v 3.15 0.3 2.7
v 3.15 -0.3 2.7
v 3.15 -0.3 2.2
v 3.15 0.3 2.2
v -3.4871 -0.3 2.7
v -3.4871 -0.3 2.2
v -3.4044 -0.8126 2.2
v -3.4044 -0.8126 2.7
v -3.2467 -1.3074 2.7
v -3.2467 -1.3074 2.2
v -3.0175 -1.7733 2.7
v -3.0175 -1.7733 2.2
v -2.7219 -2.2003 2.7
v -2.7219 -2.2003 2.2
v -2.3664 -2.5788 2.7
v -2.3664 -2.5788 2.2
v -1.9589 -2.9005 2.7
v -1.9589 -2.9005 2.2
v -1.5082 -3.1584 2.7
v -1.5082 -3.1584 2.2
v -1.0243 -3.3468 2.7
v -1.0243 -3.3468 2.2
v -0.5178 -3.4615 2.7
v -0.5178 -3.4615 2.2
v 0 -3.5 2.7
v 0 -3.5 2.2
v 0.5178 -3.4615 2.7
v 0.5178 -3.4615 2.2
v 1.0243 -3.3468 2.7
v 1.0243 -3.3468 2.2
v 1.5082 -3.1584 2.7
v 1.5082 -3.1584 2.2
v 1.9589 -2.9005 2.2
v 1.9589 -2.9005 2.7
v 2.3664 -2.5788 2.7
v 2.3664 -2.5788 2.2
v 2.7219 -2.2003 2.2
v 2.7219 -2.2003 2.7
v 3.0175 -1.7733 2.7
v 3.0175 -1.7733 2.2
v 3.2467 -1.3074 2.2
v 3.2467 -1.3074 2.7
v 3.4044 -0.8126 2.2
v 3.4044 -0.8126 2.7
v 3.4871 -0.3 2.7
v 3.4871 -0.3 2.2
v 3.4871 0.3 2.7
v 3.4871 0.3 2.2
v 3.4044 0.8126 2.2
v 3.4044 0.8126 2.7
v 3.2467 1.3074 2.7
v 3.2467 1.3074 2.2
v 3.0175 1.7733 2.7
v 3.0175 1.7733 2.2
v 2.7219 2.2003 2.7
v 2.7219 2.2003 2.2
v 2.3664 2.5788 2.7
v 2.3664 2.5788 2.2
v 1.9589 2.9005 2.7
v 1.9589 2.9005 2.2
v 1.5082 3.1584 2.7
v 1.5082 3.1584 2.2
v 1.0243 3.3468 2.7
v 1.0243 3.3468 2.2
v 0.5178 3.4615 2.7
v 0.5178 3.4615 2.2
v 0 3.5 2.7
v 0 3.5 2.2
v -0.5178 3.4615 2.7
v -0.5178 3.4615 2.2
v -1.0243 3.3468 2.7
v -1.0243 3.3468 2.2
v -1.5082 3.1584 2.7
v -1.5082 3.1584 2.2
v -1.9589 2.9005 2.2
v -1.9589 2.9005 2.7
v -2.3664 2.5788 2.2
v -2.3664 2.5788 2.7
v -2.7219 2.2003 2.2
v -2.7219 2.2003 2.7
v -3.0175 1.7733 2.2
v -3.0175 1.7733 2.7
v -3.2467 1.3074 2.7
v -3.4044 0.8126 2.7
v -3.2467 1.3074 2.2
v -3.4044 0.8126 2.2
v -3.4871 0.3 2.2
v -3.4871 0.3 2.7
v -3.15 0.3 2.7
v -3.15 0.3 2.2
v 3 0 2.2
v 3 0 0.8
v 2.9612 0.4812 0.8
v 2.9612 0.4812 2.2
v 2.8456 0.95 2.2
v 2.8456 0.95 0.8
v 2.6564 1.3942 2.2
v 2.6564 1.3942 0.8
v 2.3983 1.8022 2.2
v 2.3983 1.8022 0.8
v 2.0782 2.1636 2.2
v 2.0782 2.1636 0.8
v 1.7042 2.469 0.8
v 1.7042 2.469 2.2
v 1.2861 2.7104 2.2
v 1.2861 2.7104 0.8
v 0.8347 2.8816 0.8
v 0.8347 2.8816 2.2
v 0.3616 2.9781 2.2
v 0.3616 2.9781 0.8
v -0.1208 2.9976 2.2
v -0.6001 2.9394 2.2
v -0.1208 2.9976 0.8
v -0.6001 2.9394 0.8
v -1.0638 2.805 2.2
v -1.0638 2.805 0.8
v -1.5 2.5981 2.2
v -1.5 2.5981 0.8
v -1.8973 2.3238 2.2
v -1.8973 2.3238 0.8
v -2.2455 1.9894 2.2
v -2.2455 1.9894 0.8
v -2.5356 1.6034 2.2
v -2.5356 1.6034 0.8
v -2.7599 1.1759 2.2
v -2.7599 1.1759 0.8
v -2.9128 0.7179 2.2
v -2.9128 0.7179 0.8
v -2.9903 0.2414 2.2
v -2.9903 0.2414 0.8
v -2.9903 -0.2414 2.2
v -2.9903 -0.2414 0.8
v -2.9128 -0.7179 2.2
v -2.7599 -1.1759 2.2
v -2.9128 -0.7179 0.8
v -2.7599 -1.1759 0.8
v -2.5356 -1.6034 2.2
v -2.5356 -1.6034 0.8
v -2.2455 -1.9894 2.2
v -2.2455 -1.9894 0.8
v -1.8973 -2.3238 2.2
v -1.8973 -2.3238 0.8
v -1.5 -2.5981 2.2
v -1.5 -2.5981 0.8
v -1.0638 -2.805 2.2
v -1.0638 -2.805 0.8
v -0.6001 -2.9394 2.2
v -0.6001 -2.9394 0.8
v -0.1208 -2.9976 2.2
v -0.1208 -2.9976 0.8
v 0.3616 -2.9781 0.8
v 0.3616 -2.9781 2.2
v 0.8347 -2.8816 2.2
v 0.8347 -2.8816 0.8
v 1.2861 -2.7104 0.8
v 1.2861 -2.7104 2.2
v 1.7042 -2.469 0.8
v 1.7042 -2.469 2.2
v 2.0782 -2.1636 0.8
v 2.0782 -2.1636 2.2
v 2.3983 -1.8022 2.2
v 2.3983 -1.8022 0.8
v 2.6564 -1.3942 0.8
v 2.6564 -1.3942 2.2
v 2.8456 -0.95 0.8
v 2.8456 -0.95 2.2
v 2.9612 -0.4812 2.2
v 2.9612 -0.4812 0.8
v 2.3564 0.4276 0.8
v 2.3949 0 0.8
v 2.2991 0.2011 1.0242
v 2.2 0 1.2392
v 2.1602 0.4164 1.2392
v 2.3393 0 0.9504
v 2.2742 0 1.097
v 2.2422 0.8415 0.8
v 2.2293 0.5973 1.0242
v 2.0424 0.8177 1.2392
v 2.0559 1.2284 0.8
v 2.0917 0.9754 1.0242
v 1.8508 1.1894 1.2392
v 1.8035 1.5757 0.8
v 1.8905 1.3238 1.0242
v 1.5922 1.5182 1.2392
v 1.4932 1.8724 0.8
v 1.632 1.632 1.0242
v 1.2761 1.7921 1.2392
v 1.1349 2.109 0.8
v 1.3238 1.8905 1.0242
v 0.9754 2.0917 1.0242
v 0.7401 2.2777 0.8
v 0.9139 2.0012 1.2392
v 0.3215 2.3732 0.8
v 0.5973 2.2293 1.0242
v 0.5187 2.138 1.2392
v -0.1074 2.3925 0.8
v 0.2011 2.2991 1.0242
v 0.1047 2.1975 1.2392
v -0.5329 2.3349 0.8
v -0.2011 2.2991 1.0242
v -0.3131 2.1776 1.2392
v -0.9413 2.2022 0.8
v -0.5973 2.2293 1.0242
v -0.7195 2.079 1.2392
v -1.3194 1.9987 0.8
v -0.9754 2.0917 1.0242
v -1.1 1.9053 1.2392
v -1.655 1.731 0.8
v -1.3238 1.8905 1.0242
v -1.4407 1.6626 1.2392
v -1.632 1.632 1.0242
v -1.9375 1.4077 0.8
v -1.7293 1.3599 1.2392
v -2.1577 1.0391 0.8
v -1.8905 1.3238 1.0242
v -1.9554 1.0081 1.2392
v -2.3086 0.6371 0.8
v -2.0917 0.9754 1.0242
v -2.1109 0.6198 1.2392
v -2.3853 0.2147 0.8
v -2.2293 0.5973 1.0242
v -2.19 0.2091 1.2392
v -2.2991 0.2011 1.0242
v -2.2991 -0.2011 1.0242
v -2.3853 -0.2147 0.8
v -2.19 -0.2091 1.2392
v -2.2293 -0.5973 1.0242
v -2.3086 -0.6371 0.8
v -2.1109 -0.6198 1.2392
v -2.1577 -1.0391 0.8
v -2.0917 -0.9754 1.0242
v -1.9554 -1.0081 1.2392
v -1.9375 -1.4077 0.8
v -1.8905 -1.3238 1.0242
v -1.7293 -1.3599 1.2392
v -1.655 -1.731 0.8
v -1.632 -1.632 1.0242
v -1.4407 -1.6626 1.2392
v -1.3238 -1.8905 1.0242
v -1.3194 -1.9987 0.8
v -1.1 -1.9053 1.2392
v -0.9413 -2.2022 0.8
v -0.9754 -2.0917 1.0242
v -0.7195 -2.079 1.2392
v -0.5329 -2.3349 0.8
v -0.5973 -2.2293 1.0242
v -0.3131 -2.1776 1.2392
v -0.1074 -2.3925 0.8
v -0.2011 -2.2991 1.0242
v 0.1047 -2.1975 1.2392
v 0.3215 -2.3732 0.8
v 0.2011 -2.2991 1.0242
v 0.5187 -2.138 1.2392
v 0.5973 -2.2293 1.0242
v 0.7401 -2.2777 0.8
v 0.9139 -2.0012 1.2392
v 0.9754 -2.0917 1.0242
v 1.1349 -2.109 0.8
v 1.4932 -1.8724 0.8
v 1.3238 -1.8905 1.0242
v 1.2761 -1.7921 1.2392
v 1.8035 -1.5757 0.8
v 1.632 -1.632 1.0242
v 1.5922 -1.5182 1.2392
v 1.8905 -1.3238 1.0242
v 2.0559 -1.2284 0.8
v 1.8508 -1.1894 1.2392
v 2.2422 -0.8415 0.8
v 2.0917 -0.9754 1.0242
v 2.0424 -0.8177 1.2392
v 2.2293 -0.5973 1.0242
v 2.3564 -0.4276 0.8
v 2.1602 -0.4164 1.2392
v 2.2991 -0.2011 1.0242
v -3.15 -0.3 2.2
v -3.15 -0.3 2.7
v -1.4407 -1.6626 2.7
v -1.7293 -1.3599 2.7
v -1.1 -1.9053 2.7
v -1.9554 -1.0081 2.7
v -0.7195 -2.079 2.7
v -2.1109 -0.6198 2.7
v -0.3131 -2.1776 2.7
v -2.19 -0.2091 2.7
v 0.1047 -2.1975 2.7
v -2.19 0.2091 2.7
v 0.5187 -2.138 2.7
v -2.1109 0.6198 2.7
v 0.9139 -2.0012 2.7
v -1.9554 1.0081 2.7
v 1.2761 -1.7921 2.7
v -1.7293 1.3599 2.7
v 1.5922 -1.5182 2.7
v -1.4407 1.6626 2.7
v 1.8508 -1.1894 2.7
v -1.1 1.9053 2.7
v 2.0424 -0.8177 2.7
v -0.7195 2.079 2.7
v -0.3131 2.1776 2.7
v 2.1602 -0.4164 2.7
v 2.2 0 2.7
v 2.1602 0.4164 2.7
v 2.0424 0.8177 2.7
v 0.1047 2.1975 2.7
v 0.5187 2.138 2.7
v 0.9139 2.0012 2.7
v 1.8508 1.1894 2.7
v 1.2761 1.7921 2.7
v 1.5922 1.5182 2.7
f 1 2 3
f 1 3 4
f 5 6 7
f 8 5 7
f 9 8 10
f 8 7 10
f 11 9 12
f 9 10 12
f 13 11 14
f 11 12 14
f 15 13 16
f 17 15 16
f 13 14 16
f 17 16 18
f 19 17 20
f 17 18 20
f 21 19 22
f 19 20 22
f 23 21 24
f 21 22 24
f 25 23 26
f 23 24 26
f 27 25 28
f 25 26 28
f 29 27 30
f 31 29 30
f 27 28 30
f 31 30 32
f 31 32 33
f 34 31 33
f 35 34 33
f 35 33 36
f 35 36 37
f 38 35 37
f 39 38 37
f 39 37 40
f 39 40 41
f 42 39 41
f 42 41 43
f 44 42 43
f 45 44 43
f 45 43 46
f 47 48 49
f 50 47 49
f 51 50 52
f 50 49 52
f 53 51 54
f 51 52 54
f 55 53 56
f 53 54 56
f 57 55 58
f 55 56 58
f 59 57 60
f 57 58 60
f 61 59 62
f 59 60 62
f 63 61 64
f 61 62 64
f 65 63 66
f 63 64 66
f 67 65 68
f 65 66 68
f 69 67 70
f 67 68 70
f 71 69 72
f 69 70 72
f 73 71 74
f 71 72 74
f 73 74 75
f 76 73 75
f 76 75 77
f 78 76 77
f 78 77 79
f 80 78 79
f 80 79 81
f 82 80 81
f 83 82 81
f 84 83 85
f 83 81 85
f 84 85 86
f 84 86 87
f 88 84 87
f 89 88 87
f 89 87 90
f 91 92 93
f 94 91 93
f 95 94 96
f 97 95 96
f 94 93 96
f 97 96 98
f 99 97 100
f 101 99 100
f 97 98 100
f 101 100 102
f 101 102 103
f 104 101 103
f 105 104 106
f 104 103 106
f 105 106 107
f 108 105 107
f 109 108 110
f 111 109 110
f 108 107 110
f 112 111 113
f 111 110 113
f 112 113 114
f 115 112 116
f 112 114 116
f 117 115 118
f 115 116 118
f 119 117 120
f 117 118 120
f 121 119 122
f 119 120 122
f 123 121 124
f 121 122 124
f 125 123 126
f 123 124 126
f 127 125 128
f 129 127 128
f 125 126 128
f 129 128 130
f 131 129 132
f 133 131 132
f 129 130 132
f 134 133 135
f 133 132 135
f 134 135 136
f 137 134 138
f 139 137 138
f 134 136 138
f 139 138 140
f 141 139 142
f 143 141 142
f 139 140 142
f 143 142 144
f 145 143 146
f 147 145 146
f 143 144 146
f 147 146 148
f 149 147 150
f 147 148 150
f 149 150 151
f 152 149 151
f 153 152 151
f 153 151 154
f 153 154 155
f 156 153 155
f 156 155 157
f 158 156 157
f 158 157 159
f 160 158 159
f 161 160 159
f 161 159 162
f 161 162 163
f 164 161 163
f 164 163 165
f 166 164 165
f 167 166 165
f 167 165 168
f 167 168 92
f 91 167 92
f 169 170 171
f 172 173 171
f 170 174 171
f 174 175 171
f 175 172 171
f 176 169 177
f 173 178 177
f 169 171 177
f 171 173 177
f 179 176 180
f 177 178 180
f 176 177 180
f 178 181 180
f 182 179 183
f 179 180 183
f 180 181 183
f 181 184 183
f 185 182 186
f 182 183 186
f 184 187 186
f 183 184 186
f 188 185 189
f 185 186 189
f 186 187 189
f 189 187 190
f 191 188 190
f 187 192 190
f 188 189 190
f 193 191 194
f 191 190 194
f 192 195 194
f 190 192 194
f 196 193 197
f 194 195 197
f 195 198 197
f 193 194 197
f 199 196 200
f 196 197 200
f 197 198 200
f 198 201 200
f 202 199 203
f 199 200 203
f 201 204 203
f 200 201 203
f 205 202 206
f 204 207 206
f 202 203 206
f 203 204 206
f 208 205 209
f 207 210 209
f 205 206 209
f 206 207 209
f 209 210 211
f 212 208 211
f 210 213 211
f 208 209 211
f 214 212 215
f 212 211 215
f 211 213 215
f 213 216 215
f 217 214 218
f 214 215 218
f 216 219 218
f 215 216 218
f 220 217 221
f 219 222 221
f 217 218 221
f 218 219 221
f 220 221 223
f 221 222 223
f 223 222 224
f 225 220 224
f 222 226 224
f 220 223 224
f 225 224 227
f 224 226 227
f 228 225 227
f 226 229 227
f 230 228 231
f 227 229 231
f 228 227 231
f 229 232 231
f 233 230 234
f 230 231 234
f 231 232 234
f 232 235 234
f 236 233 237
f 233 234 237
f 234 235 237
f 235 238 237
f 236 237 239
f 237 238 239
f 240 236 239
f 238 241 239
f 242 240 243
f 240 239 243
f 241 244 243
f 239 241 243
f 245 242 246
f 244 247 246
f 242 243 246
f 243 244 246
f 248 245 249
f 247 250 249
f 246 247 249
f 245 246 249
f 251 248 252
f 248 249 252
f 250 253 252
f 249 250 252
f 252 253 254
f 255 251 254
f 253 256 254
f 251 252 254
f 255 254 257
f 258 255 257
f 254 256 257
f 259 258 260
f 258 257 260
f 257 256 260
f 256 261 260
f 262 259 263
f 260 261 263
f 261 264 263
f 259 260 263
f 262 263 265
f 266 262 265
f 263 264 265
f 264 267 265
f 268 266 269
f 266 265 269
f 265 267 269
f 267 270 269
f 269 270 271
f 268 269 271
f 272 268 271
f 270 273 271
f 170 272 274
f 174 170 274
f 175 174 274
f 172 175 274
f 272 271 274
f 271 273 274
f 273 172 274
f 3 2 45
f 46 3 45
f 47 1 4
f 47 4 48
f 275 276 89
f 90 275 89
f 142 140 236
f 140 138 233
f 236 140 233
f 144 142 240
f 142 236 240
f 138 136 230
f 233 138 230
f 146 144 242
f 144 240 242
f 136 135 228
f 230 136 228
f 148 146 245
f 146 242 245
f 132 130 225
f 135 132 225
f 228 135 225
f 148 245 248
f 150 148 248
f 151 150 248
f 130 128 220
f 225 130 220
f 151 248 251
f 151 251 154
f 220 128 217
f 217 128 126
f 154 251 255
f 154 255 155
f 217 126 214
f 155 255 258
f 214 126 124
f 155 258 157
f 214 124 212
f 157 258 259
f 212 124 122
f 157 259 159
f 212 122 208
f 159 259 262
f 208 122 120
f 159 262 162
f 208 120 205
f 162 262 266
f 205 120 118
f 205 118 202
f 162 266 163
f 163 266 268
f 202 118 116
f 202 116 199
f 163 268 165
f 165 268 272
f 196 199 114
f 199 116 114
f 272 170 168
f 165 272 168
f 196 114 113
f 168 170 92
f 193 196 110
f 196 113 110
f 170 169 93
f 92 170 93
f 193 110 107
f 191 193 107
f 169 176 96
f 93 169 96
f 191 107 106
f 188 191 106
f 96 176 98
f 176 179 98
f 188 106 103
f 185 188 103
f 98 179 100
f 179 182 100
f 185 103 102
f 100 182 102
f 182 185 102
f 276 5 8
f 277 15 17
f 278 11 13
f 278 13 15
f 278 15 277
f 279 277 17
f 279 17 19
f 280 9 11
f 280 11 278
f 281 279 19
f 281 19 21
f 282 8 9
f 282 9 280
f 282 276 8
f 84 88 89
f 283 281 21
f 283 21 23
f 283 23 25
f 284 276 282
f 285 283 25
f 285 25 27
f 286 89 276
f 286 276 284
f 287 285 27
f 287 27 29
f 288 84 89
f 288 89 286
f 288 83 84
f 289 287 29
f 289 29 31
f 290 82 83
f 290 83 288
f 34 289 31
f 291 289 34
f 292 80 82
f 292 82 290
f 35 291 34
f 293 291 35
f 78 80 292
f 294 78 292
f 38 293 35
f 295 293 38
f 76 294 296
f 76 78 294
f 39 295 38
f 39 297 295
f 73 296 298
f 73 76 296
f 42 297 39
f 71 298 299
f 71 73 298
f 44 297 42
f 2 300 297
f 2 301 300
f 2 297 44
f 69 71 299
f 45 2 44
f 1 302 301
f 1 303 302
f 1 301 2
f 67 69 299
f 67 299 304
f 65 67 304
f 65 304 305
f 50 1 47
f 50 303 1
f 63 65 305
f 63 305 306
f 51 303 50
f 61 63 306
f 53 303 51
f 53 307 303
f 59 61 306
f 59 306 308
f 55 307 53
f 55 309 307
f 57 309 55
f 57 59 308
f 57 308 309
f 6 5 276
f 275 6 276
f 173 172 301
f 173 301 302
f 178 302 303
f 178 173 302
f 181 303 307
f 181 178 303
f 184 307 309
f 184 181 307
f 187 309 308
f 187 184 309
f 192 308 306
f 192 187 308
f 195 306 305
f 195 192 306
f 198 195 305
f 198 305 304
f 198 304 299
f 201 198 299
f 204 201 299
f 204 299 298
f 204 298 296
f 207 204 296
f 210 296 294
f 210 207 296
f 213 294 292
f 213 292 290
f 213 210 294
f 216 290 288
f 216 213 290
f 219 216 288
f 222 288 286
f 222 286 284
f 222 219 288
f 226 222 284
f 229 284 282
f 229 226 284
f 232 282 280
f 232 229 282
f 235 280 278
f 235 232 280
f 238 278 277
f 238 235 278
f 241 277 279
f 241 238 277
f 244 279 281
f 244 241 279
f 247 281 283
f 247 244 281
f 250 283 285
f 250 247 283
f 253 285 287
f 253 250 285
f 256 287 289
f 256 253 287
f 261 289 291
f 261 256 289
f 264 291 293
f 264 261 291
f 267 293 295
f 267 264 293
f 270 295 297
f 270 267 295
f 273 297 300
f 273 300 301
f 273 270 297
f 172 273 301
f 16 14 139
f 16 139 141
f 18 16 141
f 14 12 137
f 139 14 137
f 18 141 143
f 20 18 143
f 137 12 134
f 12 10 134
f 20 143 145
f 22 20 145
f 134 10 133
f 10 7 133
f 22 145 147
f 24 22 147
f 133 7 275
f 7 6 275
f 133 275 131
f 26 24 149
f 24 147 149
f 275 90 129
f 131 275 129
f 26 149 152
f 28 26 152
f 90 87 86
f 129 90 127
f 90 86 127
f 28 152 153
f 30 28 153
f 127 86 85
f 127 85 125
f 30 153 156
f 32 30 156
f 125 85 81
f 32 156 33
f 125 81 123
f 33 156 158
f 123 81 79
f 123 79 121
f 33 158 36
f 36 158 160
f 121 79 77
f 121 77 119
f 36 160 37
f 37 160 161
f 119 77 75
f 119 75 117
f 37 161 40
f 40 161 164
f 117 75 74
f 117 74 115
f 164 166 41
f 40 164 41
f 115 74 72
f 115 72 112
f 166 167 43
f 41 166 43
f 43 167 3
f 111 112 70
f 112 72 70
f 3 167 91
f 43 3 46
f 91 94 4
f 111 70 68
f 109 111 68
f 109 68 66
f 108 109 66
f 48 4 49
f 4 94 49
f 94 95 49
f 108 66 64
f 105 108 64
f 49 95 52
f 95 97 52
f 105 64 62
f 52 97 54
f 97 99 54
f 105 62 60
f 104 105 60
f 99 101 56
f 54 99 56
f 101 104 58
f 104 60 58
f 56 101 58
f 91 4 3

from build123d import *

# Parameters (mm, degrees)
M6X0P35_MALE_THREAD_MAJOR_ENVELOPE_START = 0.8
SKETCH1_R                                = 3
SKETCH1_R_2                              = 2.2
M6X0P35_MALE_THREAD_MAJOR_ENVELOPE_DEPTH = 1.4
BALL_RETENTION_CAP_FLANGE_START          = 2.2
SKETCH2_R                                = 3.5
SKETCH2_R_2                              = 2.2
BALL_RETENTION_CAP_FLANGE_DEPTH          = 0.5
SKETCH3_W                                = 0.45
SKETCH3_H                                = 0.6
OPPOSED_PIN_TOOL_NOTCHES_DEPTH           = 0.5


# Read off the part's stored shape, not the designer's step: Upper_Spherical_Bearing_Seat_D5p05
with BuildPart() as part:
    # Sketch1 → M6x0p35_Male_Thread_Major_Envelope (new body)
    with BuildSketch(Plane.XY.offset(M6X0P35_MALE_THREAD_MAJOR_ENVELOPE_START)):
        Circle(SKETCH1_R)
        Circle(SKETCH1_R_2, mode=Mode.SUBTRACT)
    extrude(amount=M6X0P35_MALE_THREAD_MAJOR_ENVELOPE_DEPTH)

    # Sketch2 → Ball_Retention_Cap_Flange (add)
    with BuildSketch(Plane.XY.offset(BALL_RETENTION_CAP_FLANGE_START)):
        Circle(SKETCH2_R)
        Circle(SKETCH2_R_2, mode=Mode.SUBTRACT)
    extrude(amount=BALL_RETENTION_CAP_FLANGE_DEPTH)

    # Upper_Spherical_Bearing_Seat_D5p05 outli → Upper_Spherical_Bearing_Seat_D5p05 (revolve, cut)
    with BuildSketch(Plane.XZ):
        with BuildLine():
            Line((2.199999999, 0.799999998), (2.394916492, 0.799999998))
            ThreePointArc((2.394916492, 0.799999998), (2.307929655, 1.024248851), (2.199999999, 1.239203375))
            Line((2.199999999, 1.239203375), (2.199999999, 0.799999998))
        make_face()
    revolve(axis=Axis((0, 0, 0), (0, 0, 1)), mode=Mode.SUBTRACT)

    # Sketch3 → Opposed_Pin_Tool_Notches (cut)
    with BuildSketch(Plane.XY.offset(2.7)):
        with Locations((-3.375, 0)):
            Rectangle(SKETCH3_W, SKETCH3_H)
        with Locations((3.375, 0)):
            Rectangle(SKETCH3_W, SKETCH3_H)
    extrude(amount=-OPPOSED_PIN_TOOL_NOTCHES_DEPTH, mode=Mode.SUBTRACT)


solid = part.part
